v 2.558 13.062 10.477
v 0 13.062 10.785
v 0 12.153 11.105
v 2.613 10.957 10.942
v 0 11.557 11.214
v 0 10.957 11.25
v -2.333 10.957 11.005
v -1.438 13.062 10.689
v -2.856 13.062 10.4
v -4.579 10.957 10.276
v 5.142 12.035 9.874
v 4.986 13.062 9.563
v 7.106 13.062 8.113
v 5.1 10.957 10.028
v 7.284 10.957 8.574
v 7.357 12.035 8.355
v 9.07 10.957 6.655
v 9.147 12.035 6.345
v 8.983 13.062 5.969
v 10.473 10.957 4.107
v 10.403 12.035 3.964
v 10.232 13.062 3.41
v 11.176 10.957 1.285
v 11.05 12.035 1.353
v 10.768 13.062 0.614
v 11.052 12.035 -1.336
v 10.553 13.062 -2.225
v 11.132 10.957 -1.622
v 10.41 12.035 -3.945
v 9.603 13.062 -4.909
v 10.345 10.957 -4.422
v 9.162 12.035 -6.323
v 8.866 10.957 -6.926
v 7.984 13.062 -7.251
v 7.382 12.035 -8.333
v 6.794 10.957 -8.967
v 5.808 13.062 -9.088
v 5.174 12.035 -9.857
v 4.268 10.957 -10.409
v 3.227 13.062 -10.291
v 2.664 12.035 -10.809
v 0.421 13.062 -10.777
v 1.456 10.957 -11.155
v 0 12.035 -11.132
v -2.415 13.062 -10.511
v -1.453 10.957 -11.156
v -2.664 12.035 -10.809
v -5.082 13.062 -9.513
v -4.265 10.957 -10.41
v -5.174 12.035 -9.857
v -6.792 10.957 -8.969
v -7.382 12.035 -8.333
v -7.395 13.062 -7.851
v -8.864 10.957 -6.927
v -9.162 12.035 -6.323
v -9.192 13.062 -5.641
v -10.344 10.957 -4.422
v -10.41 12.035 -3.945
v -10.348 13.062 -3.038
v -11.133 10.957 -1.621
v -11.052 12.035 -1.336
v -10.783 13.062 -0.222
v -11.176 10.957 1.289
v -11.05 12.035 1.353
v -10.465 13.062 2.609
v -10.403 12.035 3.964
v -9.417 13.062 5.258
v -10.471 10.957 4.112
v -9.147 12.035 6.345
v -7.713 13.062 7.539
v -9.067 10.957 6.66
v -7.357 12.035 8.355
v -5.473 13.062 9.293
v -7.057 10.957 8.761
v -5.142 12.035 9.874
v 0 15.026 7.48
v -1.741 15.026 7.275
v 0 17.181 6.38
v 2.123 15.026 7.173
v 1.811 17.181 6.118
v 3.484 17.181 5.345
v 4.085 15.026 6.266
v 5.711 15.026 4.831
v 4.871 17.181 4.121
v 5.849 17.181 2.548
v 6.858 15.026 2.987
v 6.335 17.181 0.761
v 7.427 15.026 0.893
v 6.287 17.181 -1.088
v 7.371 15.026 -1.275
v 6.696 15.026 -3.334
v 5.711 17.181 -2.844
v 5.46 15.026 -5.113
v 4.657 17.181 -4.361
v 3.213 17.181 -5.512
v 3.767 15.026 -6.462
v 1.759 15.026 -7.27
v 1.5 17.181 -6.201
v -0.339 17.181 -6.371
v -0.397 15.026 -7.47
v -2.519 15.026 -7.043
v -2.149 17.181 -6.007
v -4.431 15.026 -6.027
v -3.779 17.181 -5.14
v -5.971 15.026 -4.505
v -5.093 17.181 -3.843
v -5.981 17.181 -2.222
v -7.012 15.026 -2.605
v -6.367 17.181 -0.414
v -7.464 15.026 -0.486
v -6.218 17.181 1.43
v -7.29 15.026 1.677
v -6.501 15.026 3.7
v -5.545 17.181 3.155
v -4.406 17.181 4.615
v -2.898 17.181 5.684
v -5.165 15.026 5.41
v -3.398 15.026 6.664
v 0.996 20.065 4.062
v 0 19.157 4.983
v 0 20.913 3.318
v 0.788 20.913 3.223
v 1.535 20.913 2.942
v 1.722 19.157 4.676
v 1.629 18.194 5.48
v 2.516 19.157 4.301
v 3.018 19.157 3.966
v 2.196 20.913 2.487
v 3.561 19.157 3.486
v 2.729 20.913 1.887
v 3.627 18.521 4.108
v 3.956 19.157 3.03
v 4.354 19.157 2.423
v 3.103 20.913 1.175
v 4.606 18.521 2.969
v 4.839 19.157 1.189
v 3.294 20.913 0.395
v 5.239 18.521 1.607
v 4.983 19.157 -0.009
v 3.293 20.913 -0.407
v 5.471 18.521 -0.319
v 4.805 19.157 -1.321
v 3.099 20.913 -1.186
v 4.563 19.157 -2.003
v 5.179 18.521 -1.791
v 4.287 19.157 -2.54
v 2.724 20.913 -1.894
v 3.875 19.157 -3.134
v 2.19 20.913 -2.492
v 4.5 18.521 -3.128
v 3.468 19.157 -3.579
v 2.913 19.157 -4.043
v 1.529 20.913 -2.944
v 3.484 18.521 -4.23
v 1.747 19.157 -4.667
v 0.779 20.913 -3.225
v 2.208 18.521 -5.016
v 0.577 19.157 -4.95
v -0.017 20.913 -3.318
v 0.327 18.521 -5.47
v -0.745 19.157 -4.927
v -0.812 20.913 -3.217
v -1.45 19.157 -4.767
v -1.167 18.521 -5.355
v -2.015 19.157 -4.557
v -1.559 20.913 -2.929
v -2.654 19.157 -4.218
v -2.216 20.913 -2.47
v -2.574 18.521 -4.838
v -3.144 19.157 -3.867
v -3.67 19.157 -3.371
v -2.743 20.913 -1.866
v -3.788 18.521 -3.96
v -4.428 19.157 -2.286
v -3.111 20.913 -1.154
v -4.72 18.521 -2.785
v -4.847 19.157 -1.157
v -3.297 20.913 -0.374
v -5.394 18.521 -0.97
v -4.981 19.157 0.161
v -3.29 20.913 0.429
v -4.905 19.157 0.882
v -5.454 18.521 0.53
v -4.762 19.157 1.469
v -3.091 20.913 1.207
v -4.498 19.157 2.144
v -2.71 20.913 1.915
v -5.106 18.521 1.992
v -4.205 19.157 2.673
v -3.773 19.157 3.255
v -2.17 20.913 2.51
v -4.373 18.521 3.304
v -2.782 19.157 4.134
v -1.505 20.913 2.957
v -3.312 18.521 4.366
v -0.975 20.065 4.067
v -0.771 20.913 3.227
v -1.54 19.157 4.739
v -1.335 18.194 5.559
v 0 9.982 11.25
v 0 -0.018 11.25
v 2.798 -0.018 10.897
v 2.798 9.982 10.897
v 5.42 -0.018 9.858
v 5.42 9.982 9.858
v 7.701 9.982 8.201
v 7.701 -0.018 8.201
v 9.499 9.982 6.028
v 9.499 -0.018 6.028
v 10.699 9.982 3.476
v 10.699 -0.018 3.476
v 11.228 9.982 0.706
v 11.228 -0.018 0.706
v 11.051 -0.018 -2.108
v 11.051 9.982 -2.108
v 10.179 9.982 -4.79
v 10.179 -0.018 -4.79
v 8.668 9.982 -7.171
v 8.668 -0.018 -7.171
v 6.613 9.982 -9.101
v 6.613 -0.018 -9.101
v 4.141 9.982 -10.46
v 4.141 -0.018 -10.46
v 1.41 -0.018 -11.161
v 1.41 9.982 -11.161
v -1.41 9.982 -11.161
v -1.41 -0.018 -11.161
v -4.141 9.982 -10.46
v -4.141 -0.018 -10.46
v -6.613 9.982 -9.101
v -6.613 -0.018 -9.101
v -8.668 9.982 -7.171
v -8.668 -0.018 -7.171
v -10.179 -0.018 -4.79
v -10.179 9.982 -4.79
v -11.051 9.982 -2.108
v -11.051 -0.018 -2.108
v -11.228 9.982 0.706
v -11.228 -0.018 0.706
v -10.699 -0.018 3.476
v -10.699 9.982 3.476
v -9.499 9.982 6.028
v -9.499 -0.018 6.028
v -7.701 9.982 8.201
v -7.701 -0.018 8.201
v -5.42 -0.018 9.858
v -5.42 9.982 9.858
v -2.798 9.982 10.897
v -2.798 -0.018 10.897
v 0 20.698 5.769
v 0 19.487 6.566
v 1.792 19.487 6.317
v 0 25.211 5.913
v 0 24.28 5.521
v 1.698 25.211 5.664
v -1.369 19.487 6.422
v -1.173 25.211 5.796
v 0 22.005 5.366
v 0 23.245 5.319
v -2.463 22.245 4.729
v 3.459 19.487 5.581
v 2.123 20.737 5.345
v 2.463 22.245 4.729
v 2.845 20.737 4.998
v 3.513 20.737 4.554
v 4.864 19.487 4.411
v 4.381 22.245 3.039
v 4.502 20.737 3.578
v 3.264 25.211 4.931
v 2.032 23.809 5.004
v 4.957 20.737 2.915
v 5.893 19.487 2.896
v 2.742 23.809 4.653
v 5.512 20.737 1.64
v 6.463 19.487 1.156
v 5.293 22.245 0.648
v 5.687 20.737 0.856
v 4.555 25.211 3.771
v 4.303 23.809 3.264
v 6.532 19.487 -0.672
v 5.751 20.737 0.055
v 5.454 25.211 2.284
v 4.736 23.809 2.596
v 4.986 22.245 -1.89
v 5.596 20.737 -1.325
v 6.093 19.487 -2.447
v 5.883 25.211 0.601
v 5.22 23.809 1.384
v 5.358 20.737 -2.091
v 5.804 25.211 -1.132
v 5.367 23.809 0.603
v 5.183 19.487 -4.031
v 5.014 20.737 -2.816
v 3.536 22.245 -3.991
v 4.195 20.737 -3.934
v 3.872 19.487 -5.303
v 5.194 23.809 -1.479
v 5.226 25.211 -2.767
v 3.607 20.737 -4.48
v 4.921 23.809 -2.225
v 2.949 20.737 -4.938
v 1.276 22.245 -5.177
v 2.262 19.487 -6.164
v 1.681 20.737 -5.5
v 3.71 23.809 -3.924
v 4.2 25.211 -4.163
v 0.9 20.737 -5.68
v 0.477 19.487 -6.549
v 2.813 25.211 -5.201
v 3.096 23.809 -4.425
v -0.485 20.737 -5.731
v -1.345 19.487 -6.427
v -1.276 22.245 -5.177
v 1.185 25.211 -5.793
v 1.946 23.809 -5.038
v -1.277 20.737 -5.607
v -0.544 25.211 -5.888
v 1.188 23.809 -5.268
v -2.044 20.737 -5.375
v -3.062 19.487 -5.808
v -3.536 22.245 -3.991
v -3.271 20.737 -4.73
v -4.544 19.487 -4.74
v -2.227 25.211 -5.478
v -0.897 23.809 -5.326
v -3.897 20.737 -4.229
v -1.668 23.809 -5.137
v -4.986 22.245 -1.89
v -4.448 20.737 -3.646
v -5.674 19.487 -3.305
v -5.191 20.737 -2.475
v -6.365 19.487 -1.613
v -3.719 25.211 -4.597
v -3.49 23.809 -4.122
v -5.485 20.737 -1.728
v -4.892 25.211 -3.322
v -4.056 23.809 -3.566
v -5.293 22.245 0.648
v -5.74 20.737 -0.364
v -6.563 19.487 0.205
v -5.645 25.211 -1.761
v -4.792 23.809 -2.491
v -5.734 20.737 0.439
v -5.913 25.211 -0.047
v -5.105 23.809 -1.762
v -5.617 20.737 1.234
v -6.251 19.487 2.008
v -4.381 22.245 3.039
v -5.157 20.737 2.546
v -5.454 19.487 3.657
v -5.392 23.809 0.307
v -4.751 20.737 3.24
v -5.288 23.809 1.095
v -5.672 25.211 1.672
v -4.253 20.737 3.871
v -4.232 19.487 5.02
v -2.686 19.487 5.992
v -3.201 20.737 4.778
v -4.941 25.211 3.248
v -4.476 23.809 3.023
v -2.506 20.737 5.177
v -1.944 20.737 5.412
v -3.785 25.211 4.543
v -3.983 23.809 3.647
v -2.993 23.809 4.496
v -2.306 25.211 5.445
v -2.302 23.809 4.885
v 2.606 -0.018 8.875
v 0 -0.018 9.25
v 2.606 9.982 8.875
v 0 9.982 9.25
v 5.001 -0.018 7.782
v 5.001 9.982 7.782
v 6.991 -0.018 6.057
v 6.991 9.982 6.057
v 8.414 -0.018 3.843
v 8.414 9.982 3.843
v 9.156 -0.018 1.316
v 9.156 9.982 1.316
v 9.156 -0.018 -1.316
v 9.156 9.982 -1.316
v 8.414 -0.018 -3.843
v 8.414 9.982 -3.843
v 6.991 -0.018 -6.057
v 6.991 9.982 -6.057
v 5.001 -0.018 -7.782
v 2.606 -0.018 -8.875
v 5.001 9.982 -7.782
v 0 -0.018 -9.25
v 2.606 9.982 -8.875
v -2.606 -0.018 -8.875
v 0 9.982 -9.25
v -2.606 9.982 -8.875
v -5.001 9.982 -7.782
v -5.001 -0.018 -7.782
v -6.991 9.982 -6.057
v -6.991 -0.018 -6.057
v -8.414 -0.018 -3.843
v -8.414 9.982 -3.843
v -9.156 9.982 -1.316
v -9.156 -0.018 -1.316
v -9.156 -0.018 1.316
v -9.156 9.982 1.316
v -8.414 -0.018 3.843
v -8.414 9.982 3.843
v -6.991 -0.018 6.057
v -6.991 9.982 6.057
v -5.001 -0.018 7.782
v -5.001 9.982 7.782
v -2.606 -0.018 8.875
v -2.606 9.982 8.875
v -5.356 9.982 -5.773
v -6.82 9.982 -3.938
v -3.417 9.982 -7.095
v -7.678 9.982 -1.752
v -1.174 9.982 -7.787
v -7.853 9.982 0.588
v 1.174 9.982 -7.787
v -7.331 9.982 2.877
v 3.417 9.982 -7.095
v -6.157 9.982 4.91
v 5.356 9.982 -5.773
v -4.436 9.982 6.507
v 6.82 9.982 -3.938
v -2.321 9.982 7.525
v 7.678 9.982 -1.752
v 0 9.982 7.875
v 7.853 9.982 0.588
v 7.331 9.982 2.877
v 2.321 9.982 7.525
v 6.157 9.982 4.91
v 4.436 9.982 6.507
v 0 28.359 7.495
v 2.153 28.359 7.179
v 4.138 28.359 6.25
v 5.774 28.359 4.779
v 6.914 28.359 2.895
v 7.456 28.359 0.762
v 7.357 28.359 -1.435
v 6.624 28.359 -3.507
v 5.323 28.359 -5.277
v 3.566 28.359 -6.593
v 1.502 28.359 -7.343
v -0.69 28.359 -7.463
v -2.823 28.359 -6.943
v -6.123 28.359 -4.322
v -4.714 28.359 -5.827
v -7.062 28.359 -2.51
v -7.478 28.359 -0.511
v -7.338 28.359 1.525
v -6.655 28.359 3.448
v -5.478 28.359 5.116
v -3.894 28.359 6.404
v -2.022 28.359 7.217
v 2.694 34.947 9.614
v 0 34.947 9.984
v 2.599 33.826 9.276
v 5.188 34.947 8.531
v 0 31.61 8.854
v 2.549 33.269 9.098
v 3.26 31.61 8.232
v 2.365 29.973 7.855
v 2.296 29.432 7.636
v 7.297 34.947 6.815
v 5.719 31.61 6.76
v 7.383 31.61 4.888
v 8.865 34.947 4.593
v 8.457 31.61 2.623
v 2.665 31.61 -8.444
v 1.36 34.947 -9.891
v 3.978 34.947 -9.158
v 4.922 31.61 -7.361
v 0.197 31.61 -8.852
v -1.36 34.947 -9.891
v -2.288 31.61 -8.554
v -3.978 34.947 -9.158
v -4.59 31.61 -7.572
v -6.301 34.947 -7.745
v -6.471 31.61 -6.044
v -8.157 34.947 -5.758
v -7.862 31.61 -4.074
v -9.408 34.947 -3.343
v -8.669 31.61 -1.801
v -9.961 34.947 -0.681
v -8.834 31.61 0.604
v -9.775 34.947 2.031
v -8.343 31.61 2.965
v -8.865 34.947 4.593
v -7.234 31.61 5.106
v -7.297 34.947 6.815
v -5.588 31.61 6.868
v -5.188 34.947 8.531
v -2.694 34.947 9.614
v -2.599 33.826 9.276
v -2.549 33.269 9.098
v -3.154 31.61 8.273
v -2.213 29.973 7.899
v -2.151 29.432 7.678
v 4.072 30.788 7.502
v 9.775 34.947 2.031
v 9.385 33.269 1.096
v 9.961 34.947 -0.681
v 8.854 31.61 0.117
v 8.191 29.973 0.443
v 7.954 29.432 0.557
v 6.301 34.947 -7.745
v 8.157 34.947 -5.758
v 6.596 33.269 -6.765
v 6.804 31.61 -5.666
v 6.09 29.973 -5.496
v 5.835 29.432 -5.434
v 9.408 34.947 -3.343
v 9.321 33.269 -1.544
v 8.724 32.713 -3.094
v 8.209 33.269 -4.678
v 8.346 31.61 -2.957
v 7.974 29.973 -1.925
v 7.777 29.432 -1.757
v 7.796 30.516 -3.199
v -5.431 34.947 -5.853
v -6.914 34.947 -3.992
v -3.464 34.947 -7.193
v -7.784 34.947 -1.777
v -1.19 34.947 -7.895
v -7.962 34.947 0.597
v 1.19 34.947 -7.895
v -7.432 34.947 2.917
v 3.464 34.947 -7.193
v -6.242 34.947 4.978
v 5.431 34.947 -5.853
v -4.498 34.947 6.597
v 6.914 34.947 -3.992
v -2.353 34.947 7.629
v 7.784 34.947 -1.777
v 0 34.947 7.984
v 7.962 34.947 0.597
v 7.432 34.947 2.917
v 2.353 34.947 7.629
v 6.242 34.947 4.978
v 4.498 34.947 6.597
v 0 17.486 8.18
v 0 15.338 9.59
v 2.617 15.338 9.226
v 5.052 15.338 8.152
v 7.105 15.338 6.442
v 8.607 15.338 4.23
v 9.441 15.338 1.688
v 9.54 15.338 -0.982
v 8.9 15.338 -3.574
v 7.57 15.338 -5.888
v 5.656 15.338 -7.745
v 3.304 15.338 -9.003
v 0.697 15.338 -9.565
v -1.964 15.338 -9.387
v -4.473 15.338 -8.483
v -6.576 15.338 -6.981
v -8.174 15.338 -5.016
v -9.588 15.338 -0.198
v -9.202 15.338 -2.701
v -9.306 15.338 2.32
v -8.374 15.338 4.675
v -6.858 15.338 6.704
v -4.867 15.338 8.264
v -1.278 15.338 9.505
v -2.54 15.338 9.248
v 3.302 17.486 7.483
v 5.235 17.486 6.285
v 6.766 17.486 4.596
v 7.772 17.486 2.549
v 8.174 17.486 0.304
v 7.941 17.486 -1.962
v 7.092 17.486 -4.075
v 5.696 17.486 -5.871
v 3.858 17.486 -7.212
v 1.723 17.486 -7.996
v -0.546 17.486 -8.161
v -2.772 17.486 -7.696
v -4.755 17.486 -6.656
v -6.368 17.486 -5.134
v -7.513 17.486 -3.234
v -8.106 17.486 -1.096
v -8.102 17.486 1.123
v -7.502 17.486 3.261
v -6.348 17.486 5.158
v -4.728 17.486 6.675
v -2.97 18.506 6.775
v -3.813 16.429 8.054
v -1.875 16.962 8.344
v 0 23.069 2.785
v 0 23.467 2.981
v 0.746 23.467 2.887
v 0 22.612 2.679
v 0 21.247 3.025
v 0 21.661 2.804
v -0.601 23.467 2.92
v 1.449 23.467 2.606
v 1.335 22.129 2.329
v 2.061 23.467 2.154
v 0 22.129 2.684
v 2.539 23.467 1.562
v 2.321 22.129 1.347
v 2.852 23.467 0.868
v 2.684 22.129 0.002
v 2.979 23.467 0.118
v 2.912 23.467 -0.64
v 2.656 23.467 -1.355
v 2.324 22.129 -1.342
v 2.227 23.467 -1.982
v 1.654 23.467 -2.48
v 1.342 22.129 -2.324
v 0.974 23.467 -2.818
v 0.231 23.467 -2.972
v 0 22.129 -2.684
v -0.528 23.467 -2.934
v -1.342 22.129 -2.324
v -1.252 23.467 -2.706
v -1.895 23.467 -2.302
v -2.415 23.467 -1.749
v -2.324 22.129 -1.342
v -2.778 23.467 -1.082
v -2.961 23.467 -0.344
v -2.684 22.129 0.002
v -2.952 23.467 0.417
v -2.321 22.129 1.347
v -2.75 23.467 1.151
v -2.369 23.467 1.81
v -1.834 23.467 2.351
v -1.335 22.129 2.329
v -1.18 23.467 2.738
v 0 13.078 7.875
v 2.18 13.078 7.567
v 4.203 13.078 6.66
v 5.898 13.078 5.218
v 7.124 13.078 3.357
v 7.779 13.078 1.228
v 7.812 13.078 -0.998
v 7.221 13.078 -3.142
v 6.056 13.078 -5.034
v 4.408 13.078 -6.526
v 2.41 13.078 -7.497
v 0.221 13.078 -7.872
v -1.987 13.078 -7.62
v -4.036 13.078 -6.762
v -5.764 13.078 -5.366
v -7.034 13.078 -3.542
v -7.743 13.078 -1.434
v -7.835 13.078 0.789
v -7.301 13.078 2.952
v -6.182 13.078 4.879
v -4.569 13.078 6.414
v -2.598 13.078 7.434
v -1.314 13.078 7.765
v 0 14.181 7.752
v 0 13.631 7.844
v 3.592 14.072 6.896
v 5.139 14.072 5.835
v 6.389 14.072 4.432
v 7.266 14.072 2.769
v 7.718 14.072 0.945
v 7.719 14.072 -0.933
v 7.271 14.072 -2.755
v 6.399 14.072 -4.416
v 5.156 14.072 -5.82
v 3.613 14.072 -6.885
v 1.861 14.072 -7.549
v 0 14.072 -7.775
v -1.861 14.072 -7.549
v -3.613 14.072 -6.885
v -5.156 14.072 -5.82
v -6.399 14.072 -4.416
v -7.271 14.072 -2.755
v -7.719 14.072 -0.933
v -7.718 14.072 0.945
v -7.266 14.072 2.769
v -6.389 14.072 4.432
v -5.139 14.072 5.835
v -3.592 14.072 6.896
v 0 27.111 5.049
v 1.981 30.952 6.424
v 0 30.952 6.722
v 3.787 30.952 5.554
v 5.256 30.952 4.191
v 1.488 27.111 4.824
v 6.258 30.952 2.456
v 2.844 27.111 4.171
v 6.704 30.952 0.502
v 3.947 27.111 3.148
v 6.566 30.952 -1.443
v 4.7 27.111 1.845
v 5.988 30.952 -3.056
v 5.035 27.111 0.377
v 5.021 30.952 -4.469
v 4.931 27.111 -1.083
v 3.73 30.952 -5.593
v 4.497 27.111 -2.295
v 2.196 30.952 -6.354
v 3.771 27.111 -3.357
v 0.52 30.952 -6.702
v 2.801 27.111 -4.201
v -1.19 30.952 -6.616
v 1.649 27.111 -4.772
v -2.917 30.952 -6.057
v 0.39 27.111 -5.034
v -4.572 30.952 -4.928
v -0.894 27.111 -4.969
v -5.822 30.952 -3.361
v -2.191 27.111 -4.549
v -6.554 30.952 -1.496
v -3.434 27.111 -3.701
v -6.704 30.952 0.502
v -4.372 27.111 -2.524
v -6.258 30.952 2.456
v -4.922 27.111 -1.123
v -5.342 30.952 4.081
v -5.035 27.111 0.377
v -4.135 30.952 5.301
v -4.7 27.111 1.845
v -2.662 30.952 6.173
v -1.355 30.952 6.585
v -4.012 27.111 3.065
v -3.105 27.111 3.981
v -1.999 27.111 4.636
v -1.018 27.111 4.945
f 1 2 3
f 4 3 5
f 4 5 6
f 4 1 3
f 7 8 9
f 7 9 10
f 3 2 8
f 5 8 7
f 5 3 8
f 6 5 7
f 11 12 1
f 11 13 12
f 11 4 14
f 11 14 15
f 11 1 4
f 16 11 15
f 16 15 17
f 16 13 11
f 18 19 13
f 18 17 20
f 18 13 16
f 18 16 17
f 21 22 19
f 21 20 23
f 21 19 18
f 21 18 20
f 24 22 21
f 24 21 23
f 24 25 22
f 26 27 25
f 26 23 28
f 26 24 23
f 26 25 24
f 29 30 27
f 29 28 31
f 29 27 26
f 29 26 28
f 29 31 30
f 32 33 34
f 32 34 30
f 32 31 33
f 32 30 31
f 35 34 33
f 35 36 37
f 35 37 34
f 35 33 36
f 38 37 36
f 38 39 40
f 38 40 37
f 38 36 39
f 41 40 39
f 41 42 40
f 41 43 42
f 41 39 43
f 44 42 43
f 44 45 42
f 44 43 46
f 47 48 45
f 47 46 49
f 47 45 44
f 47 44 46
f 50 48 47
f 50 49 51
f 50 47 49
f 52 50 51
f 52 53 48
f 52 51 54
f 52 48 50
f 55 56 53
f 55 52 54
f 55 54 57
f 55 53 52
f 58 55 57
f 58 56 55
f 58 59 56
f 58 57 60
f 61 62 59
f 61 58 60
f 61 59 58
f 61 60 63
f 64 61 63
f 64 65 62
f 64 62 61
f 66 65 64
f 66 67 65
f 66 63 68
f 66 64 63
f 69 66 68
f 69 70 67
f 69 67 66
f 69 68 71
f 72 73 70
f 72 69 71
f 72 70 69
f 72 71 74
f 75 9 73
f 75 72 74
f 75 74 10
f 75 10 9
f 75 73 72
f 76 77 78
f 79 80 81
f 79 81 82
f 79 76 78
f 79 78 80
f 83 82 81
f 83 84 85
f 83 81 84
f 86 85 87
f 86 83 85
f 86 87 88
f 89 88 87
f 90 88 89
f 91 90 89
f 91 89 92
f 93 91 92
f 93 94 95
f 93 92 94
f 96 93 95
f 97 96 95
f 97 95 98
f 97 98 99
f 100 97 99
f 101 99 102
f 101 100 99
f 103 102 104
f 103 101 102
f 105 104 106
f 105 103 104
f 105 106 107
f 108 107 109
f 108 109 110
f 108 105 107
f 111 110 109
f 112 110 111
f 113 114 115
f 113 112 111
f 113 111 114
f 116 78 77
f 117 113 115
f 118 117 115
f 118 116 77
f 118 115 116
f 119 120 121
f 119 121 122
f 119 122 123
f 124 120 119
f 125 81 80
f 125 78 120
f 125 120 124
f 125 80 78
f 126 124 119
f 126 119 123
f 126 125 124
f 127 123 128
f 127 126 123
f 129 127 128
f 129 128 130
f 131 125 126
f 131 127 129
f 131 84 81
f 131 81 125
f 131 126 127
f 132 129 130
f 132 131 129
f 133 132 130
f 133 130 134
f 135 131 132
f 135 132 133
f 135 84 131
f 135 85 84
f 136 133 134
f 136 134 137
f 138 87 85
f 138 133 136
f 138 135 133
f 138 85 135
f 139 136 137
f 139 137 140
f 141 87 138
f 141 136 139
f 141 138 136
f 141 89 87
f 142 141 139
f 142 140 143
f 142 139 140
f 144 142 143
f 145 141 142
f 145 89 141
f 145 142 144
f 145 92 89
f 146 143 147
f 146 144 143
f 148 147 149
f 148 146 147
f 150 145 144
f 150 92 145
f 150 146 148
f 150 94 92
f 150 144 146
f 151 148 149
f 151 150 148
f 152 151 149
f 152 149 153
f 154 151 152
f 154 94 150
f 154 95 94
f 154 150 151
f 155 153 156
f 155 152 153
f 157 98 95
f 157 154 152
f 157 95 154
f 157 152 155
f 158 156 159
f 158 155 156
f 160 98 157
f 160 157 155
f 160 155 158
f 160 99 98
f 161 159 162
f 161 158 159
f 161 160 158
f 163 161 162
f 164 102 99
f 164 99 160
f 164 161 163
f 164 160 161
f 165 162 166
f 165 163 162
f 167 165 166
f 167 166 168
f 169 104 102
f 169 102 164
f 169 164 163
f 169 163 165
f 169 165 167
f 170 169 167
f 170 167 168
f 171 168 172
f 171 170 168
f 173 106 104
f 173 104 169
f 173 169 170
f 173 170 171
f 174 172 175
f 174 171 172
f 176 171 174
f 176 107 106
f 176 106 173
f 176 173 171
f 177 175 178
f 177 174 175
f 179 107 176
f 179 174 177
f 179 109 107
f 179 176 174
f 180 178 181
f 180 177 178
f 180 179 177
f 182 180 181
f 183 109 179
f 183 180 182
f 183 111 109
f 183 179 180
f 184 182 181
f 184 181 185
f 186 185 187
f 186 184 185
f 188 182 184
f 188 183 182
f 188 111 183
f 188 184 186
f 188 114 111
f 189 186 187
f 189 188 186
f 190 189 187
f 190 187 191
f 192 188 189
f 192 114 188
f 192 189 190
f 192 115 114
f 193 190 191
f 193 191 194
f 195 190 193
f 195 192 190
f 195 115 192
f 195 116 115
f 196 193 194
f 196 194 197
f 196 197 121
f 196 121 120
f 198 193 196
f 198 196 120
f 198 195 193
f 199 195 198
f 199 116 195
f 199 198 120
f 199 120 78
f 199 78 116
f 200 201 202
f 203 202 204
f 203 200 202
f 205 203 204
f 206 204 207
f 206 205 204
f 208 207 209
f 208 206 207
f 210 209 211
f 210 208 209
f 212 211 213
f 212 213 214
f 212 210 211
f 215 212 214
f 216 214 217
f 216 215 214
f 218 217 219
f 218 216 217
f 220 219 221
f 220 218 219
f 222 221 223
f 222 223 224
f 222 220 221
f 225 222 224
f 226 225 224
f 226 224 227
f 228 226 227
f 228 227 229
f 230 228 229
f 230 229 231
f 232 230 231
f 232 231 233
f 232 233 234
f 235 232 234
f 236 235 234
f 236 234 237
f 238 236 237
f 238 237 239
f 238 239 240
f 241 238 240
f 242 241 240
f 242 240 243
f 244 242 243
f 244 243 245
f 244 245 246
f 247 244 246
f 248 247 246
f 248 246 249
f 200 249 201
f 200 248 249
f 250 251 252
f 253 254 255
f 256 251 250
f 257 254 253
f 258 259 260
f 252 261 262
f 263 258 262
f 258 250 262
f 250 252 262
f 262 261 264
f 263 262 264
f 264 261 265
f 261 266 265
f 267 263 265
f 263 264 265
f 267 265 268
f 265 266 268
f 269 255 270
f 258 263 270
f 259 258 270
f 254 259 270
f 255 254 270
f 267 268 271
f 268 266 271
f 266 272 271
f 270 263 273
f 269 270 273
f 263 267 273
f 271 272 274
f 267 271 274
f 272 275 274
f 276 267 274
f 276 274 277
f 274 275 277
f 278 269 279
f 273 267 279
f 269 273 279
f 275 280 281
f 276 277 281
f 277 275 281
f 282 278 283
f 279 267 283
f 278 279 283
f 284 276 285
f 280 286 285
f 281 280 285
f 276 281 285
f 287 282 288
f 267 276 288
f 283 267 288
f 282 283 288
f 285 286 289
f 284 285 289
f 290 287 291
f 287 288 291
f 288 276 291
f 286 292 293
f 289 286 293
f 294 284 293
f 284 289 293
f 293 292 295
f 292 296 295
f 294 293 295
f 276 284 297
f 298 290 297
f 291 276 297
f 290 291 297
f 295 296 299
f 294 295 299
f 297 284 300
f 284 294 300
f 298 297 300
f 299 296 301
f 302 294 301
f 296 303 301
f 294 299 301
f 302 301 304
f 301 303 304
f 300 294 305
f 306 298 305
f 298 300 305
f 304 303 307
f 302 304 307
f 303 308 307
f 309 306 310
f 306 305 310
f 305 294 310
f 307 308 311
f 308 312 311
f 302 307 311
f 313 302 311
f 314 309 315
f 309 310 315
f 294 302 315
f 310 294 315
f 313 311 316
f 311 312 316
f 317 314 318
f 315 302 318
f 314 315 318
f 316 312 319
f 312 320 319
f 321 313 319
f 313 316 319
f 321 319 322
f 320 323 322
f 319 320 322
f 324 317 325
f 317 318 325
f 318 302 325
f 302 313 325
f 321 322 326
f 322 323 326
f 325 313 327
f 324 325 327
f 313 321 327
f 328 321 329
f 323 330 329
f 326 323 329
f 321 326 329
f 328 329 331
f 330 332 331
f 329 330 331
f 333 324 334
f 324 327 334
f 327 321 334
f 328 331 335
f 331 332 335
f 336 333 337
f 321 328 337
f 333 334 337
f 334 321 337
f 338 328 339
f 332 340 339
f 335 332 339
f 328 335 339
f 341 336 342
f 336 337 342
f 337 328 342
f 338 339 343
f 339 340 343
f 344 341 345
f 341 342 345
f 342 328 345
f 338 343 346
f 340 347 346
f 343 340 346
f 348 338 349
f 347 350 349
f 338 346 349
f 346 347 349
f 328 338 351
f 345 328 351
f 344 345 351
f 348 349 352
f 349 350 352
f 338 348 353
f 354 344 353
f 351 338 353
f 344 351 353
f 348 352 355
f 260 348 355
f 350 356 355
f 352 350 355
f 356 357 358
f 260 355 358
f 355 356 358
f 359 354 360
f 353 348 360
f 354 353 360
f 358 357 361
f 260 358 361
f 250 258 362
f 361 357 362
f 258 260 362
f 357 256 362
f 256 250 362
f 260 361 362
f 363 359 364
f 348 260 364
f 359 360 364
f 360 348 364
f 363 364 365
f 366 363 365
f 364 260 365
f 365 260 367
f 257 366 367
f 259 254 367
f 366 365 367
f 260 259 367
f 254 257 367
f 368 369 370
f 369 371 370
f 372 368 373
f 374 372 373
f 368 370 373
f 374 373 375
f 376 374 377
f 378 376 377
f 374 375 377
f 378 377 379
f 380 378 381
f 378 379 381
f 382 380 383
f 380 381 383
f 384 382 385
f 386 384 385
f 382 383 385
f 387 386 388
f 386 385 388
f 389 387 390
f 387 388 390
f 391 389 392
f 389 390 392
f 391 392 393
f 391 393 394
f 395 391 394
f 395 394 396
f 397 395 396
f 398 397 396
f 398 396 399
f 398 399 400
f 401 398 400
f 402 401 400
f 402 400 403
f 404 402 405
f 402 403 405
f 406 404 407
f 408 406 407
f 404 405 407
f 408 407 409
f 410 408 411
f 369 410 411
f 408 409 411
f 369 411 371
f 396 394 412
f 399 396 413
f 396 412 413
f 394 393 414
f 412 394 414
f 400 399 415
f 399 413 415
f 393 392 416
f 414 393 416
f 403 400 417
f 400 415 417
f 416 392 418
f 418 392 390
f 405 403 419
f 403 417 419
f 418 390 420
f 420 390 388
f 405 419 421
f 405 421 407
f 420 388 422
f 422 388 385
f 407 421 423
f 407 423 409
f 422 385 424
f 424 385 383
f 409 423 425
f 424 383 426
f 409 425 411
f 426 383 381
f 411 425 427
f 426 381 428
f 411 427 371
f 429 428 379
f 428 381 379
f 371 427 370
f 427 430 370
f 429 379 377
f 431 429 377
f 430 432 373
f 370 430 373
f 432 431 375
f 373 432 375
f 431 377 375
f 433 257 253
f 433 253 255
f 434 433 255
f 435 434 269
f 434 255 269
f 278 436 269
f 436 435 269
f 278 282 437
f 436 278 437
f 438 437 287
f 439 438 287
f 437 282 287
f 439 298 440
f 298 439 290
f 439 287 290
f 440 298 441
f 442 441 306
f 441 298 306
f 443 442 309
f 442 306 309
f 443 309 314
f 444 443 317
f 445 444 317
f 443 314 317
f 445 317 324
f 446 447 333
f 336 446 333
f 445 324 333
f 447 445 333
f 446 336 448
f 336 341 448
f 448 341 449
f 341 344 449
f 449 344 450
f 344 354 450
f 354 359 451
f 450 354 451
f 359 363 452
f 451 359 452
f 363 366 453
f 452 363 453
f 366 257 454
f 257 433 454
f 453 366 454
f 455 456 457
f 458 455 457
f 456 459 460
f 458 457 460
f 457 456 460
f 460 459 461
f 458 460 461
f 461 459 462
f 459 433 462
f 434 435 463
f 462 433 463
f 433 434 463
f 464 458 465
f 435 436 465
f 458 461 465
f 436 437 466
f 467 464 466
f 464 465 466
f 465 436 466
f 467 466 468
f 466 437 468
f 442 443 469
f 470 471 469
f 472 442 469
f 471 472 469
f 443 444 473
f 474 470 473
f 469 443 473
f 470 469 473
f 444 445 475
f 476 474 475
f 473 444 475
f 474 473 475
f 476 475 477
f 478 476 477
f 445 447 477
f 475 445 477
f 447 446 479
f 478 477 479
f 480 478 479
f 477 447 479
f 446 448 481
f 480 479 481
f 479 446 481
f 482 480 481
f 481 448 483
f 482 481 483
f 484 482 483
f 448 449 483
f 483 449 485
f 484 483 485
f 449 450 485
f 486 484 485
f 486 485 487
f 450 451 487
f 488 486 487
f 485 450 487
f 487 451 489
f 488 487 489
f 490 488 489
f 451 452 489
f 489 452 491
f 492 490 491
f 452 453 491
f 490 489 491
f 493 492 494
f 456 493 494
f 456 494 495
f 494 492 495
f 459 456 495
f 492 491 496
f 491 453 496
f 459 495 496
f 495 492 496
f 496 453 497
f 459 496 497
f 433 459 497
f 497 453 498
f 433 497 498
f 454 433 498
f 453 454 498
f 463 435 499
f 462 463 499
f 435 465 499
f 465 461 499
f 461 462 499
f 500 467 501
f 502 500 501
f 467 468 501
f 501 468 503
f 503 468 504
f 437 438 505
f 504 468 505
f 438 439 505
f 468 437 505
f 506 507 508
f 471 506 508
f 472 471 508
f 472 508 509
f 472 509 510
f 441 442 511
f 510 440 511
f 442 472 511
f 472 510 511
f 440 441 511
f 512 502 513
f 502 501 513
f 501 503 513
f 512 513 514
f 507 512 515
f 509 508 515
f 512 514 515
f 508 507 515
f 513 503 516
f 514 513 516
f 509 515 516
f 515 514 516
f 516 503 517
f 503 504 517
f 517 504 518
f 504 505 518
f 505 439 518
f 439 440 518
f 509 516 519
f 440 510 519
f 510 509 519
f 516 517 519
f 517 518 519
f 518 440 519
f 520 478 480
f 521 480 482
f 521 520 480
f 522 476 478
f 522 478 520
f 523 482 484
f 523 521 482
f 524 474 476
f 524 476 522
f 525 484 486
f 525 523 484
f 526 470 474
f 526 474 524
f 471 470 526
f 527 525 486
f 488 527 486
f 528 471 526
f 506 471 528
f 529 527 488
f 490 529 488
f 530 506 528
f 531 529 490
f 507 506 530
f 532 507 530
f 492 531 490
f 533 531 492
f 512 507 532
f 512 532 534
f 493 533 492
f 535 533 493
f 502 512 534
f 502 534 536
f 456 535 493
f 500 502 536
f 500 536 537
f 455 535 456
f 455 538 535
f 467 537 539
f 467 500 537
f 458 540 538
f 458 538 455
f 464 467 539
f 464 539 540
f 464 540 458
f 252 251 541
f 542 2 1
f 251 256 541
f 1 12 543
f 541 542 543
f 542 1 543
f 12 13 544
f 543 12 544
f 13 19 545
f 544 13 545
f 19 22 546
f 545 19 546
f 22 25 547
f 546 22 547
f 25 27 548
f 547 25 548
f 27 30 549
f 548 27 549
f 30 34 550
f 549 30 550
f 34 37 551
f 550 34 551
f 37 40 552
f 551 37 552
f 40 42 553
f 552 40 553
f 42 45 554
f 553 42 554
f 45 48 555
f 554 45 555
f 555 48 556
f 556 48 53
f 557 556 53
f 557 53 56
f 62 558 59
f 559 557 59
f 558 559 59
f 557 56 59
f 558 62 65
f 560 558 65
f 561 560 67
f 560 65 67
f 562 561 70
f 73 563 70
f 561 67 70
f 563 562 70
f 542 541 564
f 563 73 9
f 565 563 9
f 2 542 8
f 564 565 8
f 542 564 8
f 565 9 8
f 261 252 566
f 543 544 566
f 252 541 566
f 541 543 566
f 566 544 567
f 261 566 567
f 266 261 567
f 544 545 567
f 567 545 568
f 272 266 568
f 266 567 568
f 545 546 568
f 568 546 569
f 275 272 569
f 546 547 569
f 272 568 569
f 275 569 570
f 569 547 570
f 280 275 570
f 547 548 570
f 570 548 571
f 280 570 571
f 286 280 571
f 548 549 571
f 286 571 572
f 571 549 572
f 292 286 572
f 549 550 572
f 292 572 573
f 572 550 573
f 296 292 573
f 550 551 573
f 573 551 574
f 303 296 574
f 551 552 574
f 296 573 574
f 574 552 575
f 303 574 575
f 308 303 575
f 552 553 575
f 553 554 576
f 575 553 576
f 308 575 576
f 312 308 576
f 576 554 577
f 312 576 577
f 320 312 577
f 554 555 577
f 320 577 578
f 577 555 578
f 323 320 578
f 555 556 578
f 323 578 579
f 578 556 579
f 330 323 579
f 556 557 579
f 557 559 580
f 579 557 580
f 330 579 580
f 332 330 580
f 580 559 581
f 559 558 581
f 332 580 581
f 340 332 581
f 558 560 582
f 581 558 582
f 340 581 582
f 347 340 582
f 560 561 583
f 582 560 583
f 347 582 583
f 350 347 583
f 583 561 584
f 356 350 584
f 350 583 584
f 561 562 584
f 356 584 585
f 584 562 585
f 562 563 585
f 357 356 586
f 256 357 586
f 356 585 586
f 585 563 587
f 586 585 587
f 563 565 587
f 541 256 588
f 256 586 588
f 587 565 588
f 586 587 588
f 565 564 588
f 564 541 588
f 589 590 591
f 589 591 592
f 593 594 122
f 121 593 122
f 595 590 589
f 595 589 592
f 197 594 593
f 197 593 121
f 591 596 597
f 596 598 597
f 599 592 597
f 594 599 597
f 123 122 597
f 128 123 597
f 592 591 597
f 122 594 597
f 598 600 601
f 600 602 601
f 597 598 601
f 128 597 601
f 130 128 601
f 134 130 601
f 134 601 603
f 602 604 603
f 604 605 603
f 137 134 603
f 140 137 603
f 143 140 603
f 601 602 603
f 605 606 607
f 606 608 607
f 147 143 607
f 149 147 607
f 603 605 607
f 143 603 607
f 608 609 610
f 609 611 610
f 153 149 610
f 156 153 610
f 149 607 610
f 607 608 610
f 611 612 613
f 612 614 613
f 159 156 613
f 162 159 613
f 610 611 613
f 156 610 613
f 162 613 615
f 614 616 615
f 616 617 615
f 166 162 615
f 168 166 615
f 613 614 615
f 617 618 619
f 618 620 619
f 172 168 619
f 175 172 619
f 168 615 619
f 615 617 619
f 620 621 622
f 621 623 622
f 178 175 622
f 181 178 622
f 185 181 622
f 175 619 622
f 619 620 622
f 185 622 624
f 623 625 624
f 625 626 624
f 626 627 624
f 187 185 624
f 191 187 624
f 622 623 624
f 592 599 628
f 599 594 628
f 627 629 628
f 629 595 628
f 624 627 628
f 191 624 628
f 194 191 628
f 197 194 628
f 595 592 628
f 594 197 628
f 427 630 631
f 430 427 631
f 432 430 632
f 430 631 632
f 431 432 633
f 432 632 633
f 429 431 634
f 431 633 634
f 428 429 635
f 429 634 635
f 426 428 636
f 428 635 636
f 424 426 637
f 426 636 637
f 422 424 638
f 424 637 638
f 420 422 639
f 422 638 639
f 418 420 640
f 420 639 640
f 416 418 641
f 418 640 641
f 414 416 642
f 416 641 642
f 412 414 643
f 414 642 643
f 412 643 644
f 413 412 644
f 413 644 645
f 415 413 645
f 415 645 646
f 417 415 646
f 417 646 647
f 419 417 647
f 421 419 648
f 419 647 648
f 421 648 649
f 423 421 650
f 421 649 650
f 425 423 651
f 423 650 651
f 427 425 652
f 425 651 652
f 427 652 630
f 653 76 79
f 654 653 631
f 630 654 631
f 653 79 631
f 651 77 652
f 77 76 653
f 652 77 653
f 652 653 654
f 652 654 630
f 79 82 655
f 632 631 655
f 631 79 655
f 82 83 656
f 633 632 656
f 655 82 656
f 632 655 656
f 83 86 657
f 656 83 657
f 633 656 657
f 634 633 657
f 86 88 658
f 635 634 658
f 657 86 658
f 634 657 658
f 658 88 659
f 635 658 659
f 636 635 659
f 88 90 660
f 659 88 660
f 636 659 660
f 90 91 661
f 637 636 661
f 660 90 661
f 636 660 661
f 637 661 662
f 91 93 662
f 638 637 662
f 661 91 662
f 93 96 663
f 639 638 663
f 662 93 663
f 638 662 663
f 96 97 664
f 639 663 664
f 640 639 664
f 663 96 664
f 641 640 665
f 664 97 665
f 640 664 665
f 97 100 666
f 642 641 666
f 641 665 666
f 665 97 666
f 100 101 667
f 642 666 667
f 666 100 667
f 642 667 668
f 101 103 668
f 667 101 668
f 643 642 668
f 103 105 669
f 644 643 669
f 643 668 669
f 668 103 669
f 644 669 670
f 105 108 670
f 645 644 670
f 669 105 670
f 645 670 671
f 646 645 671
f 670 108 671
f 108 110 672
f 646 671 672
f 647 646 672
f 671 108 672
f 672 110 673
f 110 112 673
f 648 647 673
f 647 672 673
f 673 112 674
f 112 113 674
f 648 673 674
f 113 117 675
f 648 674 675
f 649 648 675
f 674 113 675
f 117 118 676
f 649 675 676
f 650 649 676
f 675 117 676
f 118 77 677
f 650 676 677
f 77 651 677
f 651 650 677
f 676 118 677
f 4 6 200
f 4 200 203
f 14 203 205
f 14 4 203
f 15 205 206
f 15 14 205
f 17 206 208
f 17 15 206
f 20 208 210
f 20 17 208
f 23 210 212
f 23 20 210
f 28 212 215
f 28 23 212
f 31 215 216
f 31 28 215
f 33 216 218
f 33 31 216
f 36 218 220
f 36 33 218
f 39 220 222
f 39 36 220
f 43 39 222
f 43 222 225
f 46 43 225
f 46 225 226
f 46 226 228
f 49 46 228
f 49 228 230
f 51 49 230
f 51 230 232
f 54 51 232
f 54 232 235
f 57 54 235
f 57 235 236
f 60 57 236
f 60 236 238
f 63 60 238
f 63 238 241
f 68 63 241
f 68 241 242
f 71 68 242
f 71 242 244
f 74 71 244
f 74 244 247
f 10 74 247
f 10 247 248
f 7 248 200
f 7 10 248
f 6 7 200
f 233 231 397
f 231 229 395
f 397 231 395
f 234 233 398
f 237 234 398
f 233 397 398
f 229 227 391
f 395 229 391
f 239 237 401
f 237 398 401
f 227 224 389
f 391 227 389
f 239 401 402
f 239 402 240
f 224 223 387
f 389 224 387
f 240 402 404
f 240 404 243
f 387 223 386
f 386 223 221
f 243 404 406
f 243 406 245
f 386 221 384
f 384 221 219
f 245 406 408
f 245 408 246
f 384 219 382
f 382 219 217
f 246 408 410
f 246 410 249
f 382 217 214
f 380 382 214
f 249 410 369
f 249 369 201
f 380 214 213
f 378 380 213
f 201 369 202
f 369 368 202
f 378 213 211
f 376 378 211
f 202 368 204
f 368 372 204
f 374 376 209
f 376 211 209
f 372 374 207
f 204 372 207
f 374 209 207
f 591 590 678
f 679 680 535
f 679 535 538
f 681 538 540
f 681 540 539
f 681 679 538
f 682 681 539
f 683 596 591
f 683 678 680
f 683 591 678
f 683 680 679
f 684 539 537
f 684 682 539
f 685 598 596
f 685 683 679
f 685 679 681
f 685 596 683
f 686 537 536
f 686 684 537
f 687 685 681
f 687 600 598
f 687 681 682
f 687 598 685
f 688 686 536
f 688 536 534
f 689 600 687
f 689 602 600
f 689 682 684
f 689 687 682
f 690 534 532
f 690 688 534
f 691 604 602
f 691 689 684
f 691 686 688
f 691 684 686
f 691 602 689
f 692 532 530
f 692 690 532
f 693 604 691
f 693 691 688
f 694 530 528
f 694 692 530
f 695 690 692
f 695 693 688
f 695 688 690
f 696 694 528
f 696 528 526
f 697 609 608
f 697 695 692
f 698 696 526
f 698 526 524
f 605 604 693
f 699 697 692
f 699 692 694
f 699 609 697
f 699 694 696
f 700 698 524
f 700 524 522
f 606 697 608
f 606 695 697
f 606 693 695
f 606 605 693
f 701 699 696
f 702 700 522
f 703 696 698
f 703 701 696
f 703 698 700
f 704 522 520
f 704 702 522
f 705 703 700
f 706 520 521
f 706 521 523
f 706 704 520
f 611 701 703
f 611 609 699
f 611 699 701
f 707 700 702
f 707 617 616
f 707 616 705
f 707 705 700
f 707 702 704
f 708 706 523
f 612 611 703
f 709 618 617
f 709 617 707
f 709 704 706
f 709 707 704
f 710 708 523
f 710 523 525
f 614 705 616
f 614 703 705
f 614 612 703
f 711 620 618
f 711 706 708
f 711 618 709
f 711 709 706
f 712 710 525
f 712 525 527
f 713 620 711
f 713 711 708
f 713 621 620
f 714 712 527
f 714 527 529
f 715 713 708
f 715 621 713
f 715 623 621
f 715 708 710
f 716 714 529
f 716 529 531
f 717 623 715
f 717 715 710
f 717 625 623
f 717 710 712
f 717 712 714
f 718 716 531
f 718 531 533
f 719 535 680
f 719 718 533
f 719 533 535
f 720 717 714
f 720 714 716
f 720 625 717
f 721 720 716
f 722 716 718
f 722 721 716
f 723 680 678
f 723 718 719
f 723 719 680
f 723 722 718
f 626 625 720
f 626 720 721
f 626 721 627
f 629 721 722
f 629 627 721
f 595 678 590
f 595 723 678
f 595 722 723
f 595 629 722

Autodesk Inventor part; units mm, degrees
ref_plane "YZ Plane" through (0, 0, 0) normal (1, 0, 0) x (0, 1, 0)
ref_plane "XZ Plane" through (0, 0, 0) normal (0, 1, 0) x (-1, 0, 0)
ref_plane "XY Plane" through (0, 0, 0) normal (0, 0, 1) x (1, 0, 0)
sketch "Sketch1" plane through (0, 0, 0) normal (1, 0, 0) x (0, 1, 0)
  line L0 (9.25, 0.0185) -> (9.25, -9.9815)
  line L1 (9.25, 0.0185) -> (11.25, 0.0185)
  line L2 (11.25, 0.0185) -> (11.25, -9.9815)
  line L3 (11.25, -9.9815) -> (11.25, -12)
  arc A0 (1.9984, -22.0011) -> (7.875, -14) centre (-8.063, -8.4526) ccw
  arc A1 (7.9841, -34.947) -> (1.9984, -22.0011) centre (-30.628, -44.9433) ccw
  line L4 (9.9841, -34.947) -> (7.9841, -34.947)
  arc A2 (4, -22) -> (11.25, -12) centre (-13.1002, -1.9743) ccw
  arc A3 (9.9841, -34.947) -> (4, -22) centre (-38.5, -49.5) ccw
  line L5 (7.875, -9.9815) -> (9.25, -9.9815)
  line L6 (7.875, -9.9815) -> (7.875, -14)
  line L7 (0, 0) -> (0, -36)
  dimension "d26" = 9.25
  dimension "d28" = 2
  dimension "d36" = 10
  dimension "d37" = 34.9656
  dimension "d57" = 36
revolve "Revolution1" add sketch "Sketch1" angle 360 about axis through (0, 0, 0) along (0, 0, -1)
move or copy body "Move Body1" bodies to move or copy 1 copy no rotation origin (0, 0, 0) rotation axis (1, 0, 0) rotation angle 90
fillet "Fillet6" radius 2 1 edges at (0, 22.0011, -1.9984)
fillet "Fillet7" radius 5 1 edges at (0, 14, -7.875)
fillet "Fillet8" radius 5 1 edges at (0, 12, -11.25)
fillet "Fillet9" radius 5 1 edges at (0, 22, -4)
properties part number "nozzle" material "ABS Plastic"
